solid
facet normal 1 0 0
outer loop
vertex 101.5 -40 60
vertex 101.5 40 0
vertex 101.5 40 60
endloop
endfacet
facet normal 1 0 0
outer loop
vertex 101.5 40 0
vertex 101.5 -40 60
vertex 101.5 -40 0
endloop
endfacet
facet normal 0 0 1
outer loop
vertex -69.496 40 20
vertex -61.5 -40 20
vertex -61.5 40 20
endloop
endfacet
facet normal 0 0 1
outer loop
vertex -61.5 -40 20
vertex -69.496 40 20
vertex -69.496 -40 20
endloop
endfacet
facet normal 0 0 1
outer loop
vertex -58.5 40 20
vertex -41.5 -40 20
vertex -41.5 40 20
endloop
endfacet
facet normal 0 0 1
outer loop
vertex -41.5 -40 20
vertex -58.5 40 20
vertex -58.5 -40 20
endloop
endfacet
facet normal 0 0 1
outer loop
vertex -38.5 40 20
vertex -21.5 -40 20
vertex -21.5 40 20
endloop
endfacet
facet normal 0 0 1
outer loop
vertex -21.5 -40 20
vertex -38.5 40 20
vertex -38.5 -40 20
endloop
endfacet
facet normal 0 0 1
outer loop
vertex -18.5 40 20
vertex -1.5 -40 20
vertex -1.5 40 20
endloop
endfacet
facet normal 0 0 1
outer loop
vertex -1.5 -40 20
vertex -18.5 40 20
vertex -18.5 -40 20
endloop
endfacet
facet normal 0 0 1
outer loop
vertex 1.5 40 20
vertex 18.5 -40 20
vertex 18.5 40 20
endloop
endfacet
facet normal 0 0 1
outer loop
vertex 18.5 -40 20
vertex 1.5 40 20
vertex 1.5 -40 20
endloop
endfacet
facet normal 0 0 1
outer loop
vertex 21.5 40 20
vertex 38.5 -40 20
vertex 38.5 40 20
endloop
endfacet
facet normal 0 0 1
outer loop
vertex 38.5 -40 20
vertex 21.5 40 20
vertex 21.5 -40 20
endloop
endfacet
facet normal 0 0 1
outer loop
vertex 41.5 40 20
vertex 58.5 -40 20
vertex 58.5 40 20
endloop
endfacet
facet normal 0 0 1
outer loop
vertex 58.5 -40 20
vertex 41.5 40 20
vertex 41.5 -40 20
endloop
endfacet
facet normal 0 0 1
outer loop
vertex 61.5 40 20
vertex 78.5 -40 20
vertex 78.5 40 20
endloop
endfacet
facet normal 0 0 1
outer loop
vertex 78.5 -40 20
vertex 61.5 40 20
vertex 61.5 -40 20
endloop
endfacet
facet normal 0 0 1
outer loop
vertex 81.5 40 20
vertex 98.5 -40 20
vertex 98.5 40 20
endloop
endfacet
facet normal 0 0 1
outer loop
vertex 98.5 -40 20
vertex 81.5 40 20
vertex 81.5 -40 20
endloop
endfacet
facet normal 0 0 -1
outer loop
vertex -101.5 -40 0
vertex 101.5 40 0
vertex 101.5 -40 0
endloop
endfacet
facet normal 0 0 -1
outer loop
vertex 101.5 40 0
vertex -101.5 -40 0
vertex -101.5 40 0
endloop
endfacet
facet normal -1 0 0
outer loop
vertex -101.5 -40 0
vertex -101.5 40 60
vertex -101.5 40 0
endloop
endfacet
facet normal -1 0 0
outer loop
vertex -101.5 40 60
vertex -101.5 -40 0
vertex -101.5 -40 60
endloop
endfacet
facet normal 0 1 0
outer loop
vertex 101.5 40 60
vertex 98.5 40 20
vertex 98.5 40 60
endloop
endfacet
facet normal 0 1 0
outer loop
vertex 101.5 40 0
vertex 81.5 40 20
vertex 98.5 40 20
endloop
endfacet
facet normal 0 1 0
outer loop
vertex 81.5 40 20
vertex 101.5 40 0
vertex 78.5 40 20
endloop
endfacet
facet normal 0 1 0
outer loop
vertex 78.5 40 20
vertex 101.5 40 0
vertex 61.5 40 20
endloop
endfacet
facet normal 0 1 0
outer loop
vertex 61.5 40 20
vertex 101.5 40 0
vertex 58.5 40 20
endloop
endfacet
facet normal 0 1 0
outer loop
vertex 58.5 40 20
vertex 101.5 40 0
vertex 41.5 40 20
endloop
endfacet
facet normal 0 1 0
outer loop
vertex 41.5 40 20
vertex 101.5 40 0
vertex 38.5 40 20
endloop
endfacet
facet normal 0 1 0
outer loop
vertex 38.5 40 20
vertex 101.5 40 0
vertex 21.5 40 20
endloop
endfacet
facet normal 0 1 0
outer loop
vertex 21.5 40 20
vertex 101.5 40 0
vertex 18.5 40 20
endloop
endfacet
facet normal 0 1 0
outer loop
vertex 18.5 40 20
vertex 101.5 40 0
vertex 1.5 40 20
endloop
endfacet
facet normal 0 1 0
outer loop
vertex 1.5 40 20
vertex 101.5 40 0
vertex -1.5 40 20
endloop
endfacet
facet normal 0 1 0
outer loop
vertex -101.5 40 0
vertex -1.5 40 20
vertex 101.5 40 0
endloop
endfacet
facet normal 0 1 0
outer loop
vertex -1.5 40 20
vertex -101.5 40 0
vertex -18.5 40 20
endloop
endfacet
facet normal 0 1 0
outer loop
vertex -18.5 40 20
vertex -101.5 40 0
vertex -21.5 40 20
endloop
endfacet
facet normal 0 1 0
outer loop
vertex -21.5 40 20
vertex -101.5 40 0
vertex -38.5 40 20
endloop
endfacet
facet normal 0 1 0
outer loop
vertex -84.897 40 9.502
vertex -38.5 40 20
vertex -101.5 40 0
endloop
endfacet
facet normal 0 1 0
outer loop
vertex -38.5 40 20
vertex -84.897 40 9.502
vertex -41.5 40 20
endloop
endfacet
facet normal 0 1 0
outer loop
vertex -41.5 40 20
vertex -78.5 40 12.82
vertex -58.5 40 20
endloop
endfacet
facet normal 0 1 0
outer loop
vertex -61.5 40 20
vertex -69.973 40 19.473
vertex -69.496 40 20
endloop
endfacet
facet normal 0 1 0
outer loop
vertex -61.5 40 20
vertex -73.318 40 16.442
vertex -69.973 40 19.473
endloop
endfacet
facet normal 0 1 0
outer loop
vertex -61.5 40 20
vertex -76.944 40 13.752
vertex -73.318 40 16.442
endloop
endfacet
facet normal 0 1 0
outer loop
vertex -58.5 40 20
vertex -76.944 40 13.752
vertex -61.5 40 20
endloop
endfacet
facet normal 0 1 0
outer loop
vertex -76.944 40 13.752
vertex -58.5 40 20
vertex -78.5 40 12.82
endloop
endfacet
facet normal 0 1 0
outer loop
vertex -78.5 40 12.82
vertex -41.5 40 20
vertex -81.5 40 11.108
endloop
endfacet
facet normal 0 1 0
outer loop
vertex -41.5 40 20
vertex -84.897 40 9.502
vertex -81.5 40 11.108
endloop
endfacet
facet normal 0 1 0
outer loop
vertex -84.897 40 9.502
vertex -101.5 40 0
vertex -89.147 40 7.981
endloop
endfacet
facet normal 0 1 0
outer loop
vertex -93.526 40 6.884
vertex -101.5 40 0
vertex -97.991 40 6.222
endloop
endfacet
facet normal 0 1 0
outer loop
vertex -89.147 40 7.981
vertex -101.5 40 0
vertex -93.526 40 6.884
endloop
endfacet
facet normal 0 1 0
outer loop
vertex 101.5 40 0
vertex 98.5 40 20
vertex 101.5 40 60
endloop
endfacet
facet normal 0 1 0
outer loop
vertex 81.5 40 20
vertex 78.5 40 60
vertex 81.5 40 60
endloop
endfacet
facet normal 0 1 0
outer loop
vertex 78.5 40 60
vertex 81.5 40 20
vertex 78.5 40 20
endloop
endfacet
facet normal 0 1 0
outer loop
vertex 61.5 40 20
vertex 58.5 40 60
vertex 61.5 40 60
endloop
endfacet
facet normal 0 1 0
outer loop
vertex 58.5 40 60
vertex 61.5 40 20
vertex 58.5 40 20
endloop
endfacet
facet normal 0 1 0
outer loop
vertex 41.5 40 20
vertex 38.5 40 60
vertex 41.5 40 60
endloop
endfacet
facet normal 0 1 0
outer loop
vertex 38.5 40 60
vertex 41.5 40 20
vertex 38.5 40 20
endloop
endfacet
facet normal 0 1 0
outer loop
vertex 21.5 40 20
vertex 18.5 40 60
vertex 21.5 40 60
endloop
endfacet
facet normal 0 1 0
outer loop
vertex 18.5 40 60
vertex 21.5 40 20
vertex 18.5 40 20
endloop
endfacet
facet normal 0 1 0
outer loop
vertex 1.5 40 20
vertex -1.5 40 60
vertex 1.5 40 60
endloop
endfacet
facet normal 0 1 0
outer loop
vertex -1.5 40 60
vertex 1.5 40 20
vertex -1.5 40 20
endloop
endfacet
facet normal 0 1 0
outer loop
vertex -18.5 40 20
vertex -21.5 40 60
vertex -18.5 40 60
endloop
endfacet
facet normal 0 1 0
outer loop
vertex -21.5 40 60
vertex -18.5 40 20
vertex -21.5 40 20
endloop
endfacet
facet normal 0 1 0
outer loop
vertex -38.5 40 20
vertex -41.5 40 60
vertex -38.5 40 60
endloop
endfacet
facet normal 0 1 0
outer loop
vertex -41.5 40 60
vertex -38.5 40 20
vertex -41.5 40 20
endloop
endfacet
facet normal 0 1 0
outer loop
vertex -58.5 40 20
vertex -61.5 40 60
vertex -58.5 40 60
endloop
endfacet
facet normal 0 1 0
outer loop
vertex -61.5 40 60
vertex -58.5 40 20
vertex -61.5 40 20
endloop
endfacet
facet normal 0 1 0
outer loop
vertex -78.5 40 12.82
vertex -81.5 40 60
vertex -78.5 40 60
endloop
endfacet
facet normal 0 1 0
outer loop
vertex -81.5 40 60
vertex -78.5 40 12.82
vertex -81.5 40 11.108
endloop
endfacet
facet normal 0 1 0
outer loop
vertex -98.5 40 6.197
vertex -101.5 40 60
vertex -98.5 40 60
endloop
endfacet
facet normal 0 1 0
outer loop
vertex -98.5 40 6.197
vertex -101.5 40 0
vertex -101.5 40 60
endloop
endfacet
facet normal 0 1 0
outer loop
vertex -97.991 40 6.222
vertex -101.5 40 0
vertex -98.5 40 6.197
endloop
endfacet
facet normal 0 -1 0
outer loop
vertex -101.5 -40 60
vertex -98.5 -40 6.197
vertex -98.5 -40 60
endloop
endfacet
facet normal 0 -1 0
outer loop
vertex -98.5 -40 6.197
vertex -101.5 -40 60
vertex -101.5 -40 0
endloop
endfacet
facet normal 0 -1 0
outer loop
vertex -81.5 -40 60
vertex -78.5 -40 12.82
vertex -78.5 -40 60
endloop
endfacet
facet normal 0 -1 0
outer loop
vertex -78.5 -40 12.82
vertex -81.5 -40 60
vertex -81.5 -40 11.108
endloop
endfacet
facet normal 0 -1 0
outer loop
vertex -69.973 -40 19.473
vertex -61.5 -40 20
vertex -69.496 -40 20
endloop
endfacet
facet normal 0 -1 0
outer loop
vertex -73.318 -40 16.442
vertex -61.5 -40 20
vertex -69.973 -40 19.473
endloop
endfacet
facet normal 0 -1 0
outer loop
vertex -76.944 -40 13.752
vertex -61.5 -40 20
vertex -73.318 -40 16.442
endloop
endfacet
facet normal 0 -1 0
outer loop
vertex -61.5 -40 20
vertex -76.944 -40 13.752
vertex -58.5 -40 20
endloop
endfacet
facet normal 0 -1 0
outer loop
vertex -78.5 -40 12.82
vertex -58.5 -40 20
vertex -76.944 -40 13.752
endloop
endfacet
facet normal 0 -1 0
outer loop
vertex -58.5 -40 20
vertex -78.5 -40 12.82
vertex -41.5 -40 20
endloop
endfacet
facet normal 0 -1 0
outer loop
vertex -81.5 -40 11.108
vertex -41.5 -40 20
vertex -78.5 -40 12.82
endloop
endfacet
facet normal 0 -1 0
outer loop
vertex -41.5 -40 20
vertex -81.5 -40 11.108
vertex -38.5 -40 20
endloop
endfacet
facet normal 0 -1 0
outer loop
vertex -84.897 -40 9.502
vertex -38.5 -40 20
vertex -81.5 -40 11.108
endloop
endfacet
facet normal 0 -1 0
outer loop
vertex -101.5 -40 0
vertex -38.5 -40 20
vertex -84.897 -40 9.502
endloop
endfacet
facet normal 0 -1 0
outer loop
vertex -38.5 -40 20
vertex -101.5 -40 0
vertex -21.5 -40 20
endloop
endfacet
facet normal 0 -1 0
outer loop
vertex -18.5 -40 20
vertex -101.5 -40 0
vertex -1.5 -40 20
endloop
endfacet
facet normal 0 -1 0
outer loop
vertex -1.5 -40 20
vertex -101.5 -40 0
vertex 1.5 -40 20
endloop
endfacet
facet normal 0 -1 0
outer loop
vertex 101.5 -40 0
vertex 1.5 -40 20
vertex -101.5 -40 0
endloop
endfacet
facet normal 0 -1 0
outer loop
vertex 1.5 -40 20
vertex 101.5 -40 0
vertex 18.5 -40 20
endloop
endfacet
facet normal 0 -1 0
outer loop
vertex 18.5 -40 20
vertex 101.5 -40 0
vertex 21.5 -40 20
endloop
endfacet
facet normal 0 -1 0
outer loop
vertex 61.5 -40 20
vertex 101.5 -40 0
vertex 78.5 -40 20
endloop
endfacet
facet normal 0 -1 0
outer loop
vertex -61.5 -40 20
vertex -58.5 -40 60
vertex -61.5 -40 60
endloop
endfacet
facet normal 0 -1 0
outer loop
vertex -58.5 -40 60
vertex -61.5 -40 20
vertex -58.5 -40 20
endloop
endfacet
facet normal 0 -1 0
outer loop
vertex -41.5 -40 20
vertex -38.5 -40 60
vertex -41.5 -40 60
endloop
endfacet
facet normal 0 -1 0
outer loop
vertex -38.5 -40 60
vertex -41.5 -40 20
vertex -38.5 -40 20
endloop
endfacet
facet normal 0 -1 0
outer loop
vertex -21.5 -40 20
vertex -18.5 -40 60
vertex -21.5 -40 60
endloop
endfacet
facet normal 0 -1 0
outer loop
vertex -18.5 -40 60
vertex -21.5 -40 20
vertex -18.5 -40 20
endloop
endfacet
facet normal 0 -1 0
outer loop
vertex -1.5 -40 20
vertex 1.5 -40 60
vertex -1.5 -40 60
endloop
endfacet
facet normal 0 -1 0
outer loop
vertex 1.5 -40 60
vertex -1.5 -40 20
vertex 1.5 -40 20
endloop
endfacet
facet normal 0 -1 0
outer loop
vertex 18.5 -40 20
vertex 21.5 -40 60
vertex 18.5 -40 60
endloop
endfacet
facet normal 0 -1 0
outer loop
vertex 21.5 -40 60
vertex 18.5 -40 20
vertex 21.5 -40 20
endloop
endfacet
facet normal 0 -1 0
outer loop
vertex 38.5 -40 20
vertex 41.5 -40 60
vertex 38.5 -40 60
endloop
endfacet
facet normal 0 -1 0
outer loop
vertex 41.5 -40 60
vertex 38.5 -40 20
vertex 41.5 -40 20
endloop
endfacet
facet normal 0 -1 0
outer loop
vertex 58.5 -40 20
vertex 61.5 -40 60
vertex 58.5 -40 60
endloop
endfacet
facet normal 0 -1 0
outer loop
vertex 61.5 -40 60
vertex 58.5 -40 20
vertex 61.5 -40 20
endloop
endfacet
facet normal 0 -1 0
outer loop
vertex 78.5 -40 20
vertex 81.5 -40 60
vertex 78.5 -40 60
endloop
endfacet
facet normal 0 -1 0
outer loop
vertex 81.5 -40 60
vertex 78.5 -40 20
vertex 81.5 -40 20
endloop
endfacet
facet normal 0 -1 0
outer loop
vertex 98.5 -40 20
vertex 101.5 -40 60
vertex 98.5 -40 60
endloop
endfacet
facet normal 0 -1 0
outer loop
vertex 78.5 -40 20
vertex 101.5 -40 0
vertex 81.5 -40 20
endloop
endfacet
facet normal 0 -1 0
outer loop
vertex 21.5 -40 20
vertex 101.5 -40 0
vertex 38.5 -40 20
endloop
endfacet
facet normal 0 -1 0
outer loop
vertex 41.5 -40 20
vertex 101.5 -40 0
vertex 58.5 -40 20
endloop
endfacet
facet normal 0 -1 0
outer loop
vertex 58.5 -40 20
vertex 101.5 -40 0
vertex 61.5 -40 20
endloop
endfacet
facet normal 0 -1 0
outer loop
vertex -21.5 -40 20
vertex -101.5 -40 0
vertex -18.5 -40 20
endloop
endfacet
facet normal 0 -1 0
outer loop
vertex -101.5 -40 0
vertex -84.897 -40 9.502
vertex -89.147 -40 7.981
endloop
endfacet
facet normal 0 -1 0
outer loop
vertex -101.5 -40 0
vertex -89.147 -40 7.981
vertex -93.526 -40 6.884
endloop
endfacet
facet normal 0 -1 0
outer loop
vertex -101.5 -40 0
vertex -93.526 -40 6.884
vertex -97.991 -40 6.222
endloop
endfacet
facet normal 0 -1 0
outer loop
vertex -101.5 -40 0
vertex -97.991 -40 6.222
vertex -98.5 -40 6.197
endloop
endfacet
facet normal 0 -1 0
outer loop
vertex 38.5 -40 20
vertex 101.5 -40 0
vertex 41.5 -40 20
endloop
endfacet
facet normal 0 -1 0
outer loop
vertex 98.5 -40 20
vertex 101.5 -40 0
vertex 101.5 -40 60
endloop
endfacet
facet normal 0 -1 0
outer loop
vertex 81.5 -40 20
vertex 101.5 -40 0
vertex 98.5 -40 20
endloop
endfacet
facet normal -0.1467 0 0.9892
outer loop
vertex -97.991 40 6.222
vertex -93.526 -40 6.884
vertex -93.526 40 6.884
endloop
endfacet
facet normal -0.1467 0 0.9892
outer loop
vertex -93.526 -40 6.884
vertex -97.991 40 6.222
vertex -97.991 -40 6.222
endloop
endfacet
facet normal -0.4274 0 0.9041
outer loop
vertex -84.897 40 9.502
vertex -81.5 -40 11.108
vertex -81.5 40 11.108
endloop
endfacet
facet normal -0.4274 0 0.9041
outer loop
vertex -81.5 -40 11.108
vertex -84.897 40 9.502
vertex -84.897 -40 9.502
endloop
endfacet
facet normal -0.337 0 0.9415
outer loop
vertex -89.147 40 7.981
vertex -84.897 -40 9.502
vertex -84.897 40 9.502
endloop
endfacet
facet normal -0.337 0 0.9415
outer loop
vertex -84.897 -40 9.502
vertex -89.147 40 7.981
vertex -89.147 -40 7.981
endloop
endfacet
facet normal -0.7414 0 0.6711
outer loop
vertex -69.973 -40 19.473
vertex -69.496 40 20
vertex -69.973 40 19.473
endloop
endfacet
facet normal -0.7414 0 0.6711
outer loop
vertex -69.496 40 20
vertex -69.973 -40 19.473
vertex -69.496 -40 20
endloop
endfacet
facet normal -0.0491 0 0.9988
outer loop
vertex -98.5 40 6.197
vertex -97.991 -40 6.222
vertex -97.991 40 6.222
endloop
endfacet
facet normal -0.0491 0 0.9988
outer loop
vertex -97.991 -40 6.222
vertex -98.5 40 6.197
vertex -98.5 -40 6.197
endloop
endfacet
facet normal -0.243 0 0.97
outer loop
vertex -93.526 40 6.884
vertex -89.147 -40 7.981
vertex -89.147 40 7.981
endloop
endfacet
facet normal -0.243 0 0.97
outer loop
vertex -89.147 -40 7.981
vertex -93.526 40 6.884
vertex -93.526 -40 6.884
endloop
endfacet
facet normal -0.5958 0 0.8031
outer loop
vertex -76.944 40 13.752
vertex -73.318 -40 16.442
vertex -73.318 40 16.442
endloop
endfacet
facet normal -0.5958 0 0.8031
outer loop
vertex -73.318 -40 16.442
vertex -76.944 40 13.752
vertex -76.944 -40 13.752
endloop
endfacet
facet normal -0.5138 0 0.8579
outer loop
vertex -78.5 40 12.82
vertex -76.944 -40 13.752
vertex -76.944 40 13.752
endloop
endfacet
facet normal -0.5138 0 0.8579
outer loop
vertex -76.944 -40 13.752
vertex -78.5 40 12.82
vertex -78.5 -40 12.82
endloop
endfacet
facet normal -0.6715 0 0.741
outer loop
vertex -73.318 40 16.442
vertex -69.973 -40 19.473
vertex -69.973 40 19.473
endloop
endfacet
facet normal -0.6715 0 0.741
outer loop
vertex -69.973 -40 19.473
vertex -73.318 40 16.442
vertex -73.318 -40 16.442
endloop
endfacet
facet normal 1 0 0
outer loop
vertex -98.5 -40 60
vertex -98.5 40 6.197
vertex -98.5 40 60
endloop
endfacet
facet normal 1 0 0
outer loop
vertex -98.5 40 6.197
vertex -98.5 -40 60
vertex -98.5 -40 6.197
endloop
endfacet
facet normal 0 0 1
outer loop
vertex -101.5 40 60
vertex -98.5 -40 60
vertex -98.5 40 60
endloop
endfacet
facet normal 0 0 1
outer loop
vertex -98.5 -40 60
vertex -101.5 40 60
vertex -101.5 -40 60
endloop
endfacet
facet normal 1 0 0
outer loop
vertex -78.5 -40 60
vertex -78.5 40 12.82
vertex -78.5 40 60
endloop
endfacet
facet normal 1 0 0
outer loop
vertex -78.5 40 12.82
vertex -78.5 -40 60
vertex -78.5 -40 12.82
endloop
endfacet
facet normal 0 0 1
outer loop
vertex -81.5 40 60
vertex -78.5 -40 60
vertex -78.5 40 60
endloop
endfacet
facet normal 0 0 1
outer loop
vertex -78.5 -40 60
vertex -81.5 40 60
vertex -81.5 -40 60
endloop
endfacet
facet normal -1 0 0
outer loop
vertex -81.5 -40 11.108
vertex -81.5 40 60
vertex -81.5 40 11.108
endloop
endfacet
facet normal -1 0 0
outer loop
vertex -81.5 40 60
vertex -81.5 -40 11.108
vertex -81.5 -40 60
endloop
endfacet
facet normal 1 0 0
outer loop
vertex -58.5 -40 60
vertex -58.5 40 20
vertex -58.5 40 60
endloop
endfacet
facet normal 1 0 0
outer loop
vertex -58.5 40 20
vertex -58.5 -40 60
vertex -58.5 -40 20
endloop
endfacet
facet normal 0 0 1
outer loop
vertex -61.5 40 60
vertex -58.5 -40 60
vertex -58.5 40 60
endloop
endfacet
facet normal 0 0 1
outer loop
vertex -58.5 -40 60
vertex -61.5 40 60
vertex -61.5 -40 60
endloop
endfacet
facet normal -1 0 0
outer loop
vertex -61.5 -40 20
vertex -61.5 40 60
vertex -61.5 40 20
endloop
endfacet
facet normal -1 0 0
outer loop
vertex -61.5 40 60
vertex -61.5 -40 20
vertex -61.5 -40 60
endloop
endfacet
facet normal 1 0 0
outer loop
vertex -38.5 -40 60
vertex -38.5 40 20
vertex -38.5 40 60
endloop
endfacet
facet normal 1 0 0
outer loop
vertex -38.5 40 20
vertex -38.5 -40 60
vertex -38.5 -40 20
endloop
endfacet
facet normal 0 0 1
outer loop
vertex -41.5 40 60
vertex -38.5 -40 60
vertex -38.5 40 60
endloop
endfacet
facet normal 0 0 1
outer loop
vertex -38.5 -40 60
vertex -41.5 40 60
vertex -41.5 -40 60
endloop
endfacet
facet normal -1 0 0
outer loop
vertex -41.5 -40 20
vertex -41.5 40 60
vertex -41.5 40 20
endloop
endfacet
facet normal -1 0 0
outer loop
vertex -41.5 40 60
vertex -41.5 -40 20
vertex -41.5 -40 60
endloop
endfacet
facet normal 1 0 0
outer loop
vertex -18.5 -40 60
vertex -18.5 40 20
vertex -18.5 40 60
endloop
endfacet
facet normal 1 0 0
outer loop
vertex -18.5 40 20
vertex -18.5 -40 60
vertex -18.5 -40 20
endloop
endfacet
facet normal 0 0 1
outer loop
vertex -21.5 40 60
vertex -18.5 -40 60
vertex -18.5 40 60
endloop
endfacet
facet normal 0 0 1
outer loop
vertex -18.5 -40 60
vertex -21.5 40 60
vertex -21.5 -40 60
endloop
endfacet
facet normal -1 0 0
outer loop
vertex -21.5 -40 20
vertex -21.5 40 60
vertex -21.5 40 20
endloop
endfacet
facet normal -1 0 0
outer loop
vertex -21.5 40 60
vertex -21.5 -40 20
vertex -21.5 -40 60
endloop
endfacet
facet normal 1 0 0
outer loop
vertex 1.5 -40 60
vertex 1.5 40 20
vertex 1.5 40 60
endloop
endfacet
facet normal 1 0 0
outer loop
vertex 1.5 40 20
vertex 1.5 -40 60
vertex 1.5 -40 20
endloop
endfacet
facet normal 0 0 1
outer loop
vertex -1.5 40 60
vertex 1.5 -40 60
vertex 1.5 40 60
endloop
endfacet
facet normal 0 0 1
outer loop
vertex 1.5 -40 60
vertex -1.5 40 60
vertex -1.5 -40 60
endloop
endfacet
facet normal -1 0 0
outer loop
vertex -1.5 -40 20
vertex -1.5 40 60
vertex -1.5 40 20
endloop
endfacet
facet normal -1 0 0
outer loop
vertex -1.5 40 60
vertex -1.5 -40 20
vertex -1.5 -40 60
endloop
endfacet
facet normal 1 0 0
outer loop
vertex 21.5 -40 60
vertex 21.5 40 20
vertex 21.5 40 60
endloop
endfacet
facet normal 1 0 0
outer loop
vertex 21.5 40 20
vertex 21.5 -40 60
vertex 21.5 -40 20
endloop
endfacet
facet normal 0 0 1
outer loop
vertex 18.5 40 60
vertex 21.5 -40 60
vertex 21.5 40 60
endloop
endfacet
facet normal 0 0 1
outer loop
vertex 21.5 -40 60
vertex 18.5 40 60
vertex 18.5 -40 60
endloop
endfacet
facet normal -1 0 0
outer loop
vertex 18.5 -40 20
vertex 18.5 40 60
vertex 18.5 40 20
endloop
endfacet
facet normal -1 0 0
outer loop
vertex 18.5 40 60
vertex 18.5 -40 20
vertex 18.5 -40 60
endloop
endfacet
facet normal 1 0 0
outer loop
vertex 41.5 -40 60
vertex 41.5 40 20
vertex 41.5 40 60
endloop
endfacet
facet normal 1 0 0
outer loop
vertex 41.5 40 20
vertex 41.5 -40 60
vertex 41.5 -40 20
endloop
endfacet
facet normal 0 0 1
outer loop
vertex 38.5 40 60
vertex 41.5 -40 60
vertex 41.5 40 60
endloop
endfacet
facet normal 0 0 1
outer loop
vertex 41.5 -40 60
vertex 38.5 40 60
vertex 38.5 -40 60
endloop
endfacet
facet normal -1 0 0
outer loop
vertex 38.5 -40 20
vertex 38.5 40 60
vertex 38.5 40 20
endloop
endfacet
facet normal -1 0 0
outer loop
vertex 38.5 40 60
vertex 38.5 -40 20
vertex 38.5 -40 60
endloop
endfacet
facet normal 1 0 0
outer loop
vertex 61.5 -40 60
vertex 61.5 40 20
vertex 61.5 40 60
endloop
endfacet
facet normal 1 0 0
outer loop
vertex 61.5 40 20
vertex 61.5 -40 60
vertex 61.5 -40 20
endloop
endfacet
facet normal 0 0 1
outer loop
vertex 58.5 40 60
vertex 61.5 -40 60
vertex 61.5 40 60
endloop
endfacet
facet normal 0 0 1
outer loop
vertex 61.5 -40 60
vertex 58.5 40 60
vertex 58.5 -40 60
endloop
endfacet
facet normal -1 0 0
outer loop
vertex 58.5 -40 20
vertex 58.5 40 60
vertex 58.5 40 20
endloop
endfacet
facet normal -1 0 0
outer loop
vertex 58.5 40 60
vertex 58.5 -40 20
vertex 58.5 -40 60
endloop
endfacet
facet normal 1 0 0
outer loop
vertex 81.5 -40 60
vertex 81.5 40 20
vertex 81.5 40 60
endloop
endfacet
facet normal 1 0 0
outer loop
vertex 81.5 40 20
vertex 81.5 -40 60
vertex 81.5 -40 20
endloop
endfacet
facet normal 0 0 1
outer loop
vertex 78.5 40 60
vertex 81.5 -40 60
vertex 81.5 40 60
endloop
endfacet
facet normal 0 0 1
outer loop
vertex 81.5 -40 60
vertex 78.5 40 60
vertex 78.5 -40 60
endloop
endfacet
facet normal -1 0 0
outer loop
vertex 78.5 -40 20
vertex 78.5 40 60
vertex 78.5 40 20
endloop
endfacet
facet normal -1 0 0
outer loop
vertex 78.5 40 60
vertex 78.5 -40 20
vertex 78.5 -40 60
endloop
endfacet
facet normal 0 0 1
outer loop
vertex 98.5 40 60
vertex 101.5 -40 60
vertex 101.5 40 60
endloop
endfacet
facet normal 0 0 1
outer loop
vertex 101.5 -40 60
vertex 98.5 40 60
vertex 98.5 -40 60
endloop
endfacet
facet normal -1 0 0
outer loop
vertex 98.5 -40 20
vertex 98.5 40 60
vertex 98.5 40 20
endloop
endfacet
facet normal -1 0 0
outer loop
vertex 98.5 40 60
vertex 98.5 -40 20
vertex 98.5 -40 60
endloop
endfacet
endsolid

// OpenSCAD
// 10-slot Petri dish rack, printed as used (rests on XY plane, builds +Z)

// ---- Base block ----
base_L = 203;   // length along X
base_W = 80;    // width along Y
base_H = 20;    // height of the solid base block

// ---- Cradle (cylindrical cutout) ----
cradle_R = 46;  // radius of the inside of the cradle cylinder
cradle_cy = 0;  // Y coordinate of the cradle axis
cradle_cz = 52; // Z coordinate of the cradle axis  (bottoms out at 52 - 46 = 6)

// ---- Divider plates ----
div_T = 3;      // plate thickness along X
div_H = 60;     // plate height (z = 0 to 60)
div_W = 80;     // plate width along Y (same as base)
div_X = [-100, -80, -60, -40, -20, 0, 20, 40, 60, 80, 100]; // 11 plates, 20 mm apart

// ---- Curved-surface resolution ----
$fn = 64;

// Base block, centred on origin in X and Y, resting on z = 0
module base() { translate([-base_L/2, -base_W/2, 0])
    cube([base_L, base_W, base_H]); }

// Cradle cutter: cylinder axis along X at (y = 0, z = 52), extended 1 mm past each end
module cradle() { translate([-base_L/2 - 1, cradle_cy, cradle_cz])
    rotate([90, 0, 0])
    cylinder(h = base_L + 2, r = cradle_R, center = true); }

// Eleven divider plates (cradle is NOT cut through them)
module dividers() { for (x = div_X)
    translate([x - div_T/2, -div_W/2, 0])
        cube([div_T, div_W, div_H]); }

// Final solid: (base with cradle removed) unioned with the divider plates
difference() {
    union() {
        base();
    }
    cradle();
}
union() {
    difference() {
        base();
        cradle();
    }
    dividers();
}
